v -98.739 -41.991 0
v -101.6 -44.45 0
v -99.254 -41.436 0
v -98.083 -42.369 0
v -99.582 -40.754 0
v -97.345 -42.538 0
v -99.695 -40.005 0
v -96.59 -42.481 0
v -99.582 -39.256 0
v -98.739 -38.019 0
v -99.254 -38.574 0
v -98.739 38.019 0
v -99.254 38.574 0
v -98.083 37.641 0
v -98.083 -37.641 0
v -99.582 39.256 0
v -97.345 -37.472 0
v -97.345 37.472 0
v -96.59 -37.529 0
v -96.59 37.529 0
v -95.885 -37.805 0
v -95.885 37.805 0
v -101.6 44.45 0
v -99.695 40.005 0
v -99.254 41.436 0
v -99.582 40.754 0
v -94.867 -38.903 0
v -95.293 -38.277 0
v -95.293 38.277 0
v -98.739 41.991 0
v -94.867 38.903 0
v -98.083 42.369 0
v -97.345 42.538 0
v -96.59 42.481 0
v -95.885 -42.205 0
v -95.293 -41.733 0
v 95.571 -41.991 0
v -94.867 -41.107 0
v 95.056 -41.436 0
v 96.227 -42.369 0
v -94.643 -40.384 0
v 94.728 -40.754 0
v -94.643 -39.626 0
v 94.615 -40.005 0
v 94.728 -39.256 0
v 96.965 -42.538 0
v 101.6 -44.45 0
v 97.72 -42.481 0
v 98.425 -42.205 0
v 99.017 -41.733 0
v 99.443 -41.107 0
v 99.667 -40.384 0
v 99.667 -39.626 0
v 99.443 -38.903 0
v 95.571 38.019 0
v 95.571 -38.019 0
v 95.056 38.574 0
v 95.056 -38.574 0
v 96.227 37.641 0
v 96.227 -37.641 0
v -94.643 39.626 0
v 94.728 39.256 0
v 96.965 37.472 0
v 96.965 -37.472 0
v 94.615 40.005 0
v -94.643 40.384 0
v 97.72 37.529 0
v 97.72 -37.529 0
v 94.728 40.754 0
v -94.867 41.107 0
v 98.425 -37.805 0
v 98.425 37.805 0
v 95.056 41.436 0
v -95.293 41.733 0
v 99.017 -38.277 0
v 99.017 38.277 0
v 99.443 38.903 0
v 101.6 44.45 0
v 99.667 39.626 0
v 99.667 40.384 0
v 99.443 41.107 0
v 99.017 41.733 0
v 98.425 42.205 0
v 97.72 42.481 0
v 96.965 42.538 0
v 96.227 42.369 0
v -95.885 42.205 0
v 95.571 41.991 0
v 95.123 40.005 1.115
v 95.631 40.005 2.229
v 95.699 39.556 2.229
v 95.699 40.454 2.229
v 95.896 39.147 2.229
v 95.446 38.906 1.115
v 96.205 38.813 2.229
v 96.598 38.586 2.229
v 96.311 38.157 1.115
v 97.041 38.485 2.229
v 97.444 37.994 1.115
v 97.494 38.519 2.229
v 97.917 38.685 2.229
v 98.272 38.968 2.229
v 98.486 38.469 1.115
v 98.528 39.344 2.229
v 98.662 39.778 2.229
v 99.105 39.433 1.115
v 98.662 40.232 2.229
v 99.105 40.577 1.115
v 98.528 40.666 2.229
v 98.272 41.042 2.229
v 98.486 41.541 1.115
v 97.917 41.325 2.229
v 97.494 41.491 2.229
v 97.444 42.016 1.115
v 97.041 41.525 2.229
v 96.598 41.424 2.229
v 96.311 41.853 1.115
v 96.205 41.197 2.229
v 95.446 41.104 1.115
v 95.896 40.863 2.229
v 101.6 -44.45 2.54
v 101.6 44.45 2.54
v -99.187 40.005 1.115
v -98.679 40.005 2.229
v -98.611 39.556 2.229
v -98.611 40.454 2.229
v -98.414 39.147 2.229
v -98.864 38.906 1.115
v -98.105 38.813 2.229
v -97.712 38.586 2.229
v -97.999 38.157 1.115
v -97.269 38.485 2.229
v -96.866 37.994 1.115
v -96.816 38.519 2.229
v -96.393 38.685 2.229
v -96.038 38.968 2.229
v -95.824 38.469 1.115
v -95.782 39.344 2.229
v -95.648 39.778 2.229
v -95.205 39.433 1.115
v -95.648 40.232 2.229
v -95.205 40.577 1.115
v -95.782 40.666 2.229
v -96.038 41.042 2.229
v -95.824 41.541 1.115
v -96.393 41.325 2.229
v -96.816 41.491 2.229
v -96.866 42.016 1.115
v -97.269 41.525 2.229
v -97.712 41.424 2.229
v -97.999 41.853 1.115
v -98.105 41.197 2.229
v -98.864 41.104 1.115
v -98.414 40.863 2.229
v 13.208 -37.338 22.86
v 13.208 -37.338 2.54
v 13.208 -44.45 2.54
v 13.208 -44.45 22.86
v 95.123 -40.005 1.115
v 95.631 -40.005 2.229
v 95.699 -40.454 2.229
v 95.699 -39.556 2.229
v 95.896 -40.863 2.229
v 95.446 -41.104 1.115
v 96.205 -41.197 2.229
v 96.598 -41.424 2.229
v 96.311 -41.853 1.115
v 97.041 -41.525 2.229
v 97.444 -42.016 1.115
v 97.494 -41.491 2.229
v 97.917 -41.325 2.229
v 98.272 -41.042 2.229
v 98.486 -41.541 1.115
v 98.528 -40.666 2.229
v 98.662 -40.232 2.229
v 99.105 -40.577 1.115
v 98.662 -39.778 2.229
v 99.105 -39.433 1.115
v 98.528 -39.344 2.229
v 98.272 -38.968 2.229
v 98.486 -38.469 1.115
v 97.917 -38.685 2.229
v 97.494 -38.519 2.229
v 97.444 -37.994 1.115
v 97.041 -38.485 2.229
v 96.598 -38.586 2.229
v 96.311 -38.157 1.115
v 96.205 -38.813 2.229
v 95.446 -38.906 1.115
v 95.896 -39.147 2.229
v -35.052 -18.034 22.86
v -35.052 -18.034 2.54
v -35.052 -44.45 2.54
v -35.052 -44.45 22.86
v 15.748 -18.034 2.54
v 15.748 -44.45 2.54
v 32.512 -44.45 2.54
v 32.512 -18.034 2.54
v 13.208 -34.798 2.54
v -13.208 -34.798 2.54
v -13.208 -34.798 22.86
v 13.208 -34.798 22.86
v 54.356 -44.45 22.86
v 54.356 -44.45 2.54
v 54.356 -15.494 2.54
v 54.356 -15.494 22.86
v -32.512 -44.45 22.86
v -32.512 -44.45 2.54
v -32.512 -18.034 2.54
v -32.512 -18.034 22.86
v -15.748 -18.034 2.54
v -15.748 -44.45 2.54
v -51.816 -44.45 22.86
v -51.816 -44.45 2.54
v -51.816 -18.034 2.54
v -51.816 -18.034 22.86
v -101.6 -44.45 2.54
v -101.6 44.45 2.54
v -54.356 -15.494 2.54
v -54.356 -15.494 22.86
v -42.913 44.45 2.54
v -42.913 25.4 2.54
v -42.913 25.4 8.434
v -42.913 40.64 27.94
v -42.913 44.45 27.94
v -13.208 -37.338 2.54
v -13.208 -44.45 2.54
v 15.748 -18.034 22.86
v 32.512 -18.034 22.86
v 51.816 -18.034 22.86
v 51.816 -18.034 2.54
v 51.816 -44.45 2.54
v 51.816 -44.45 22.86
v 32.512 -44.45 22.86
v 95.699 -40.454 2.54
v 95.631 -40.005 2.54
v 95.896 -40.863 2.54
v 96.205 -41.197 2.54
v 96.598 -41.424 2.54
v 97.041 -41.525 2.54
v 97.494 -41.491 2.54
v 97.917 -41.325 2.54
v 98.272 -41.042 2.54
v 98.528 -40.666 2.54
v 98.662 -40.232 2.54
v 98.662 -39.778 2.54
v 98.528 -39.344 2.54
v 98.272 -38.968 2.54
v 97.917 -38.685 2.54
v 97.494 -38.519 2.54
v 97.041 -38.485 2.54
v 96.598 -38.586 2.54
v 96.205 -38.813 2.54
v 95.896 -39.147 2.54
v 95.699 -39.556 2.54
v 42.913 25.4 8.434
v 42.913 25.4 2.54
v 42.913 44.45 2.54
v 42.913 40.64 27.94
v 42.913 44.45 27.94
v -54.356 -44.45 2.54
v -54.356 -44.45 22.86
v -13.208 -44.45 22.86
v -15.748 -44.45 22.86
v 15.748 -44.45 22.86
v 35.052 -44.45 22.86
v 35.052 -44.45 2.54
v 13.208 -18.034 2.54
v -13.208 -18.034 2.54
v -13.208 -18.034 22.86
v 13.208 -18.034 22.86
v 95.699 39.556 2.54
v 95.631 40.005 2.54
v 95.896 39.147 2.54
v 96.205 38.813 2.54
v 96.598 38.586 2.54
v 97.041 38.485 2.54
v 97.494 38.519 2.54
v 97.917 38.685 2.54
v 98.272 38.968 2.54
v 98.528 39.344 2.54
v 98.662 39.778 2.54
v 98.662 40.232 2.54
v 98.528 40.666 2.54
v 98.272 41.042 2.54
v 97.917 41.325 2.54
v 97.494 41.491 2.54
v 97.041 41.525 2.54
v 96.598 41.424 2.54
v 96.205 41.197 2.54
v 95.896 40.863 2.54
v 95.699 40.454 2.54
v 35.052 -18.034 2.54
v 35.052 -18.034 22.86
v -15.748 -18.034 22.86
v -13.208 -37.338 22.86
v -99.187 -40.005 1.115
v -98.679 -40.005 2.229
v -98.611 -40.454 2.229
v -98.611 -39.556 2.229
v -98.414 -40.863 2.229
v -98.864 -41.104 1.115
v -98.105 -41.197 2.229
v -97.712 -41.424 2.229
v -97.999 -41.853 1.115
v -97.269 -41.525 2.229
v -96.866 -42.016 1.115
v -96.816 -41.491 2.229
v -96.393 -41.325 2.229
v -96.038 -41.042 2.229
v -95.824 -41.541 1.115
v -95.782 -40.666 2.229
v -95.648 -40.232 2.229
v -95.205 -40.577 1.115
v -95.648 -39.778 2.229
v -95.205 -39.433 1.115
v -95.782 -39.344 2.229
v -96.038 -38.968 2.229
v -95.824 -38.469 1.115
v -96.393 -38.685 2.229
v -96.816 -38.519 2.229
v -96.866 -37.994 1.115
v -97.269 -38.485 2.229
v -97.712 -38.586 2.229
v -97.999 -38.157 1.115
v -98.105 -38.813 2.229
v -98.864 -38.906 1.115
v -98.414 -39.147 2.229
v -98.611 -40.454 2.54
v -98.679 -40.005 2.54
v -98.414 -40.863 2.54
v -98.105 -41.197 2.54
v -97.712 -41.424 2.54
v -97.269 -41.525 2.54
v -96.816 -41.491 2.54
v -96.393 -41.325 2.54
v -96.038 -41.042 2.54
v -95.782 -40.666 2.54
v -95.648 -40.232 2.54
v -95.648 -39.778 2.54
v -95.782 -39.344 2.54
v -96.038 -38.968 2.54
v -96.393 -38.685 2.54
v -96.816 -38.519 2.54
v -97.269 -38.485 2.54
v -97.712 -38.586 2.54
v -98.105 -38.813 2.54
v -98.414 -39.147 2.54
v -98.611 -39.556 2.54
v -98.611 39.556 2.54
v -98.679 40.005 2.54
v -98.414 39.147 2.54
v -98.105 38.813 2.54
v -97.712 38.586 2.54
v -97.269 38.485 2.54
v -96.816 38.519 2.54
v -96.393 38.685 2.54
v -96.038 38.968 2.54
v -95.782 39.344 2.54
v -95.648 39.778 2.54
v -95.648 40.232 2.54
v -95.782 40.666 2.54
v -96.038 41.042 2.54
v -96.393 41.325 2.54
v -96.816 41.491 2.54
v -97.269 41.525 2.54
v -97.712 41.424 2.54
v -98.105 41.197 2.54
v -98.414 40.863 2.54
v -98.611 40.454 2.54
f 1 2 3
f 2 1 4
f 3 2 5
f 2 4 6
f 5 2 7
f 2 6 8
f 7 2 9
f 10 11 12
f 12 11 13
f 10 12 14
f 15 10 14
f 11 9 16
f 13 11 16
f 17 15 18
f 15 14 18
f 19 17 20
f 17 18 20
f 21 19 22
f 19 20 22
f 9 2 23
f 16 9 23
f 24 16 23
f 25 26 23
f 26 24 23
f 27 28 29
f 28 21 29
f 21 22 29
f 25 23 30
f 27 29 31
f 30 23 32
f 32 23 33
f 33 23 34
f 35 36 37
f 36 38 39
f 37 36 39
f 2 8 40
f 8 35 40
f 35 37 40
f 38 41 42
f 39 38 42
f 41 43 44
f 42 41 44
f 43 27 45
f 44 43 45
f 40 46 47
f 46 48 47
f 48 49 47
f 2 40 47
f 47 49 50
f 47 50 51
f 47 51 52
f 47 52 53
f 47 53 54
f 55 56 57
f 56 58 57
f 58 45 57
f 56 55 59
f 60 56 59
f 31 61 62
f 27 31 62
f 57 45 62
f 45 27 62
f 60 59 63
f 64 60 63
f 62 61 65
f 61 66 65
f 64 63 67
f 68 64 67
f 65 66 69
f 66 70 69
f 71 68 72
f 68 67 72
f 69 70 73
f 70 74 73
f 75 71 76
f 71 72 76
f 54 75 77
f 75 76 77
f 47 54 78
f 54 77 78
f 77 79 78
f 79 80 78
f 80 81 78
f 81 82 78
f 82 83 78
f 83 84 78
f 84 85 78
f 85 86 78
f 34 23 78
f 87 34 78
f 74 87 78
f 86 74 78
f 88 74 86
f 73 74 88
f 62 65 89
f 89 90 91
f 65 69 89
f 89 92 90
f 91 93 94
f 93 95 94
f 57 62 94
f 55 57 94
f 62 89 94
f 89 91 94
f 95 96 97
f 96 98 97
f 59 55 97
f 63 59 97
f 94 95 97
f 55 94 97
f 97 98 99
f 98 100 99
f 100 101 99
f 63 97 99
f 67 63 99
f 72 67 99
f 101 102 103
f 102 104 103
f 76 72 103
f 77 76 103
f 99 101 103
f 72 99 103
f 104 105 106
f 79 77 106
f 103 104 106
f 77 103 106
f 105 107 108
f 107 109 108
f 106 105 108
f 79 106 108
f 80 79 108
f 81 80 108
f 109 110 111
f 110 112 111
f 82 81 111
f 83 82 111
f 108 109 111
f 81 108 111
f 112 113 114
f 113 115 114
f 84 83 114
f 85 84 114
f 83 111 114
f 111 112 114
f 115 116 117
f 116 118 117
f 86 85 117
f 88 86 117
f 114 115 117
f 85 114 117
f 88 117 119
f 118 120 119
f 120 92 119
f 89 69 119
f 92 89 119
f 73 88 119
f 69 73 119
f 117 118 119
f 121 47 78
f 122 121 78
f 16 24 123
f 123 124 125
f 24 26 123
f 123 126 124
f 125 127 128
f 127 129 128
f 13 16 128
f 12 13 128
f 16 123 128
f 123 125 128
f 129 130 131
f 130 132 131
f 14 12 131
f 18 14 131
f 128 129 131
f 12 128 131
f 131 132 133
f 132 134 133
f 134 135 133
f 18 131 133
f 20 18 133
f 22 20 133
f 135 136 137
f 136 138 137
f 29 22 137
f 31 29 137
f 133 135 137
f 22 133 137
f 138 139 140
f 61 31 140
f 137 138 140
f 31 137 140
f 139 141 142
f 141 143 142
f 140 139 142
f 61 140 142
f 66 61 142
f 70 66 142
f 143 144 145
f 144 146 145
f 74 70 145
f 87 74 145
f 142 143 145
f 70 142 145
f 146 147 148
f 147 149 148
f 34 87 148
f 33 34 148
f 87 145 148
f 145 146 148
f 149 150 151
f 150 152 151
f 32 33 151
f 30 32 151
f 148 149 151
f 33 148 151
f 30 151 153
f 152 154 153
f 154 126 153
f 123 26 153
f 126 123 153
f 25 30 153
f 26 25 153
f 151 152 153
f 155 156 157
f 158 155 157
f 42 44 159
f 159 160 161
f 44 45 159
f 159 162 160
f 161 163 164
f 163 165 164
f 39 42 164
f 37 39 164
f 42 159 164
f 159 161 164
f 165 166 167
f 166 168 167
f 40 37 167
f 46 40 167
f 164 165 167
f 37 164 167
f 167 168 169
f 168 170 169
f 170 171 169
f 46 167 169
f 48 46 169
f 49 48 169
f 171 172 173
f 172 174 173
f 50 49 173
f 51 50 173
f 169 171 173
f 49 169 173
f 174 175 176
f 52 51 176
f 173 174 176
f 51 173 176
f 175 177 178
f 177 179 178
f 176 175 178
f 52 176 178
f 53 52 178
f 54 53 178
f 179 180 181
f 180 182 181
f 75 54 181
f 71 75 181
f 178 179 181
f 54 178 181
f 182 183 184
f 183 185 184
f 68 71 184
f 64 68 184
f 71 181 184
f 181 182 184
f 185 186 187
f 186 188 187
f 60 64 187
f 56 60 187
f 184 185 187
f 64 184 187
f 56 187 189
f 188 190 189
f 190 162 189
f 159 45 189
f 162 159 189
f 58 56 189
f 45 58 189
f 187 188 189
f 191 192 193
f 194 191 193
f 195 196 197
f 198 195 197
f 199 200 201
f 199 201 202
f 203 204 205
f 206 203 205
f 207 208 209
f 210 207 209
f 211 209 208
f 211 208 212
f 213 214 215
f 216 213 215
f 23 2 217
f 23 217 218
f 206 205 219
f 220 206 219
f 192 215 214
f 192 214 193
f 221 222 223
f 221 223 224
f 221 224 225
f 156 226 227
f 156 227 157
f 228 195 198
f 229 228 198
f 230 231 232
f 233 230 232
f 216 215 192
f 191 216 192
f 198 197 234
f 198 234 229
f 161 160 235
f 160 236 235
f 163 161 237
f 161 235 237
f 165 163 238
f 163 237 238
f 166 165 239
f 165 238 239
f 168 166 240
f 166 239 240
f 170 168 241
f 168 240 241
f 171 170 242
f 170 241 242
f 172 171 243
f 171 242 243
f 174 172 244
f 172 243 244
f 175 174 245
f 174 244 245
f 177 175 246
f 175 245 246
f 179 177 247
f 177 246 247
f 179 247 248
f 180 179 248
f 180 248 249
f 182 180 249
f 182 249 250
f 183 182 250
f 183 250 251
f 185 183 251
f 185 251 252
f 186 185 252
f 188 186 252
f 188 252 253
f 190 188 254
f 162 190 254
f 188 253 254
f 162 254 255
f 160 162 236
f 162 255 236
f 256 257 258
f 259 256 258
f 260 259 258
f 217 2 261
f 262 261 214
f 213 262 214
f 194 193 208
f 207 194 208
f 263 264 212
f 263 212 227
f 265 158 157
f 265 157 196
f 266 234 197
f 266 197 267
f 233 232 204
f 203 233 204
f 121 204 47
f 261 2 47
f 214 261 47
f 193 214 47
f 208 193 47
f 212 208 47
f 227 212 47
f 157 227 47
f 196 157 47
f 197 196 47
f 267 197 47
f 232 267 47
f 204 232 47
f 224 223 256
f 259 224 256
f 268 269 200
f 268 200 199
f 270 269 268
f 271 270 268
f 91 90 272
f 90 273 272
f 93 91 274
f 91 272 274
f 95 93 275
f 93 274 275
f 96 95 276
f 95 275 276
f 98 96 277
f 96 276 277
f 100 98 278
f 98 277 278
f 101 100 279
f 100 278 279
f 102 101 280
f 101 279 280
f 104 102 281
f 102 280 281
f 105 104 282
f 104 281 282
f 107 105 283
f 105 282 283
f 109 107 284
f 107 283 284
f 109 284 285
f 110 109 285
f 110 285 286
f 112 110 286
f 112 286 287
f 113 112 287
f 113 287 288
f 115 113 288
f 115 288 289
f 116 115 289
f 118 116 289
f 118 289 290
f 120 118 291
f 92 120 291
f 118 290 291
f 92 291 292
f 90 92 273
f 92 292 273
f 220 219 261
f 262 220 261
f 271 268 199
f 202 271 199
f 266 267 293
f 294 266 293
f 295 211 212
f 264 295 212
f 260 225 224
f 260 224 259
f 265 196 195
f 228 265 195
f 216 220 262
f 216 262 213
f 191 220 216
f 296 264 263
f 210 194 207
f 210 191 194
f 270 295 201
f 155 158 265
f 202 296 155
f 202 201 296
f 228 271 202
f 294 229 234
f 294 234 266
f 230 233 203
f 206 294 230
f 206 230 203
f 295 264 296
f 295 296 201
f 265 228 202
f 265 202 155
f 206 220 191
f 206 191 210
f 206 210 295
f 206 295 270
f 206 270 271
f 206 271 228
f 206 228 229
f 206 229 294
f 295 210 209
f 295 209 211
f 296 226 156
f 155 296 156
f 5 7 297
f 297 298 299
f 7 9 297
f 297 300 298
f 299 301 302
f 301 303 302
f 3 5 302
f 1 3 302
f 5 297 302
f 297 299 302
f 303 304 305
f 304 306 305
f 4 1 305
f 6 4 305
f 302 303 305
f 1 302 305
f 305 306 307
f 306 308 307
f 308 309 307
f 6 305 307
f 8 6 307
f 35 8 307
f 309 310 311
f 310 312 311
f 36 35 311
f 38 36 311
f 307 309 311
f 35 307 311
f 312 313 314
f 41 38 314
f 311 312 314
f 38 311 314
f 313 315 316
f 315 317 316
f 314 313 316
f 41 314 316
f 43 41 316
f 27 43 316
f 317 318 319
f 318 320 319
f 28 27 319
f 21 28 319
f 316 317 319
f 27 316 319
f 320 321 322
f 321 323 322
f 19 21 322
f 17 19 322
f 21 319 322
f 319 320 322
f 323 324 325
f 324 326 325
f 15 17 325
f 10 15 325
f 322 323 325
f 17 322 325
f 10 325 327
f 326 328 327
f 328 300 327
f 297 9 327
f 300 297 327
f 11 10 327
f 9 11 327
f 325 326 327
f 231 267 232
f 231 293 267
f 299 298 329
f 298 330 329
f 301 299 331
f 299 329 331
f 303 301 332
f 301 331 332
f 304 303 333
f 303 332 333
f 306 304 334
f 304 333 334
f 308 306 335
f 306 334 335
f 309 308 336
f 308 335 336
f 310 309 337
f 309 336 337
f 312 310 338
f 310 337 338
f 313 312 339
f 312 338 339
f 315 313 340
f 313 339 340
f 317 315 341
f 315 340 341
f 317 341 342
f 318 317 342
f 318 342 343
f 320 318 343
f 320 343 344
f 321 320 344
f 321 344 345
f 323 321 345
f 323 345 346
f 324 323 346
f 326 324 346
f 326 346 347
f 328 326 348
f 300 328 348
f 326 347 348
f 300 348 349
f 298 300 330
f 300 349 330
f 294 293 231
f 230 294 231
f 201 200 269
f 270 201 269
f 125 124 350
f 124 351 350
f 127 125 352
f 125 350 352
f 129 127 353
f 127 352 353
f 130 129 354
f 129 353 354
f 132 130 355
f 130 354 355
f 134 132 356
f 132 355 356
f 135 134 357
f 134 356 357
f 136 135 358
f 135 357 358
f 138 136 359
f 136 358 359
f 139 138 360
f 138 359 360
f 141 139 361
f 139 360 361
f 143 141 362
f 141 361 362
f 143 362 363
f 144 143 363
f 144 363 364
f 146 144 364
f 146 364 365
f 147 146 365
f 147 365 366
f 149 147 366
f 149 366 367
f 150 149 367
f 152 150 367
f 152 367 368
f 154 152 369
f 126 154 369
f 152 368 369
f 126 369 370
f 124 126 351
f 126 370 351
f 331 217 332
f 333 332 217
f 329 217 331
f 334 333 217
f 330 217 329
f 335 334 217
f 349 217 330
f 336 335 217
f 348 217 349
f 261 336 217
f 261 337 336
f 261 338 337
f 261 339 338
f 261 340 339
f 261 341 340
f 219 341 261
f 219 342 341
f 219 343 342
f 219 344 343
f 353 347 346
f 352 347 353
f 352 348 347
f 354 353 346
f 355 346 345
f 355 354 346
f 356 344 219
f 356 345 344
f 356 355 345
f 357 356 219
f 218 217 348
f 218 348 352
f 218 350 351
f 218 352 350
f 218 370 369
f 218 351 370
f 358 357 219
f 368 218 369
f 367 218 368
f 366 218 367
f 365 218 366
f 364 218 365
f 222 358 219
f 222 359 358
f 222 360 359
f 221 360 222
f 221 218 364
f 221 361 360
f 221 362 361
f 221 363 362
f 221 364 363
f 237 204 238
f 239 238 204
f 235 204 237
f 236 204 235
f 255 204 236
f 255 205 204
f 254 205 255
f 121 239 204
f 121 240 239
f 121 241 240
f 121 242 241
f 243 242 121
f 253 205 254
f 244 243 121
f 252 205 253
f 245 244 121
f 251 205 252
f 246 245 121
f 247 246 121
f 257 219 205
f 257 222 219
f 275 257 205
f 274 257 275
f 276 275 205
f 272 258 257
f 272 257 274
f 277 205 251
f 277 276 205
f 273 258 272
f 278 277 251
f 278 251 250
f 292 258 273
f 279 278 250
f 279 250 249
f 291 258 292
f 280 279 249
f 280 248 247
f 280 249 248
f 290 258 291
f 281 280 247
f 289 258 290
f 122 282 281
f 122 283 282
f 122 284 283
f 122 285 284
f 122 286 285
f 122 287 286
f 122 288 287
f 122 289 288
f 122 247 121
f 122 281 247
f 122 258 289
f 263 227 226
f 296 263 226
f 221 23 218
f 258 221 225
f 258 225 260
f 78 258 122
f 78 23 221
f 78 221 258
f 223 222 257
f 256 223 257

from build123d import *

# Parameters (mm, degrees)
F0_W           = 203.2
F0_H           = 88.9
F1_DEPTH       = 2.54
F2_W           = 2.54
F2_H           = 26.416
F2_H_2         = 2.54
F2_W_2         = 16.764
F2_W_3         = 26.416
F3_DEPTH       = 20.32
F5_D           = 3.048
F5_CSINK_D     = 5.08
F5_CSINK_ANGLE = 49
F2_W_4         = 85.8261585236
F2_H_3         = 19.05
F6_DEPTH       = 25.4
F7_SIZE2       = 19.5063104746
F7_SIZE        = 15.24


with BuildPart() as f1:
    # F0 (on Top) → F1 (new body)
    with BuildSketch(Plane.XY):
        Rectangle(F0_W, F0_H)
    extrude(amount=F1_DEPTH)

    # F2 (on face) → F3 (join)
    with BuildSketch(Plane.XY.offset(2.54)):
        with Locations((-33.782, -31.242)):
            Rectangle(F2_W, F2_H)
        with Locations((-53.086, -31.242)):
            Rectangle(F2_W, F2_H)
        with Locations((-53.086, -16.764)):
            Rectangle(F2_W, F2_H_2)
        with Locations((33.782, -31.242)):
            Rectangle(F2_W, F2_H)
        with Locations((53.086, -31.242)):
            Rectangle(F2_W, F2_H)
        with Locations((53.086, -16.764)):
            Rectangle(F2_W, F2_H_2)
        with Locations((-24.13, -16.764)):
            Rectangle(F2_W_2, F2_H_2)
        with Locations((-14.478, -16.764)):
            Rectangle(F2_W, F2_H_2)
        with Locations((24.13, -16.764)):
            Rectangle(F2_W_2, F2_H_2)
        with Locations((14.478, -16.764)):
            Rectangle(F2_W, F2_H_2)
        with Locations((-33.782, -16.764)):
            Rectangle(F2_W, F2_H_2)
        with Locations((-43.434, -16.764)):
            Rectangle(F2_W_2, F2_H_2)
        with Locations((33.782, -16.764)):
            Rectangle(F2_W, F2_H_2)
        with Locations((43.434, -16.764)):
            Rectangle(F2_W_2, F2_H_2)
        with Locations((0, -16.764)):
            Rectangle(F2_W_3, F2_H_2)
        Polygon((13.208, -37.338), (13.208, -44.45), (15.748, -44.45), (15.748, -18.034), (13.208, -18.034), (13.208, -34.798), align=None)
        Polygon((-15.748, -18.034), (-15.748, -44.45), (-13.208, -44.45), (-13.208, -37.338), (-13.208, -34.798), (-13.208, -18.034), align=None)
        with Locations((0, -36.068)):
            Rectangle(F2_W_3, F2_H_2)
    extrude(amount=F3_DEPTH)

    # F5 (through all)
    with Locations(Plane(origin=(0, 0, 0), x_dir=(1, 0, 0), z_dir=(0, 0, -1))):
        with Locations((97.155, -40.005), (97.155, 40.005), (-97.155, 40.005), (-97.155, -40.005)):
            CounterSinkHole(F5_D / 2, F5_CSINK_D / 2, counter_sink_angle=F5_CSINK_ANGLE)

    # F2 (on face) → F6 (join)
    with BuildSketch(Plane.XY.offset(2.54)):
        with Locations((0, 34.925)):
            Rectangle(F2_W_4, F2_H_3)
    extrude(amount=F6_DEPTH)

    # F7
    f7_edges = [f1.edges().sort_by_distance(p)[0] for p in [
        (0, 25.4, 27.94),
    ]]
    f7_side = f1.faces().sort_by_distance((0, 34.925, 27.94))[0]
    chamfer(f7_edges, length=F7_SIZE, length2=F7_SIZE2, reference=f7_side)


solid = f1.part
